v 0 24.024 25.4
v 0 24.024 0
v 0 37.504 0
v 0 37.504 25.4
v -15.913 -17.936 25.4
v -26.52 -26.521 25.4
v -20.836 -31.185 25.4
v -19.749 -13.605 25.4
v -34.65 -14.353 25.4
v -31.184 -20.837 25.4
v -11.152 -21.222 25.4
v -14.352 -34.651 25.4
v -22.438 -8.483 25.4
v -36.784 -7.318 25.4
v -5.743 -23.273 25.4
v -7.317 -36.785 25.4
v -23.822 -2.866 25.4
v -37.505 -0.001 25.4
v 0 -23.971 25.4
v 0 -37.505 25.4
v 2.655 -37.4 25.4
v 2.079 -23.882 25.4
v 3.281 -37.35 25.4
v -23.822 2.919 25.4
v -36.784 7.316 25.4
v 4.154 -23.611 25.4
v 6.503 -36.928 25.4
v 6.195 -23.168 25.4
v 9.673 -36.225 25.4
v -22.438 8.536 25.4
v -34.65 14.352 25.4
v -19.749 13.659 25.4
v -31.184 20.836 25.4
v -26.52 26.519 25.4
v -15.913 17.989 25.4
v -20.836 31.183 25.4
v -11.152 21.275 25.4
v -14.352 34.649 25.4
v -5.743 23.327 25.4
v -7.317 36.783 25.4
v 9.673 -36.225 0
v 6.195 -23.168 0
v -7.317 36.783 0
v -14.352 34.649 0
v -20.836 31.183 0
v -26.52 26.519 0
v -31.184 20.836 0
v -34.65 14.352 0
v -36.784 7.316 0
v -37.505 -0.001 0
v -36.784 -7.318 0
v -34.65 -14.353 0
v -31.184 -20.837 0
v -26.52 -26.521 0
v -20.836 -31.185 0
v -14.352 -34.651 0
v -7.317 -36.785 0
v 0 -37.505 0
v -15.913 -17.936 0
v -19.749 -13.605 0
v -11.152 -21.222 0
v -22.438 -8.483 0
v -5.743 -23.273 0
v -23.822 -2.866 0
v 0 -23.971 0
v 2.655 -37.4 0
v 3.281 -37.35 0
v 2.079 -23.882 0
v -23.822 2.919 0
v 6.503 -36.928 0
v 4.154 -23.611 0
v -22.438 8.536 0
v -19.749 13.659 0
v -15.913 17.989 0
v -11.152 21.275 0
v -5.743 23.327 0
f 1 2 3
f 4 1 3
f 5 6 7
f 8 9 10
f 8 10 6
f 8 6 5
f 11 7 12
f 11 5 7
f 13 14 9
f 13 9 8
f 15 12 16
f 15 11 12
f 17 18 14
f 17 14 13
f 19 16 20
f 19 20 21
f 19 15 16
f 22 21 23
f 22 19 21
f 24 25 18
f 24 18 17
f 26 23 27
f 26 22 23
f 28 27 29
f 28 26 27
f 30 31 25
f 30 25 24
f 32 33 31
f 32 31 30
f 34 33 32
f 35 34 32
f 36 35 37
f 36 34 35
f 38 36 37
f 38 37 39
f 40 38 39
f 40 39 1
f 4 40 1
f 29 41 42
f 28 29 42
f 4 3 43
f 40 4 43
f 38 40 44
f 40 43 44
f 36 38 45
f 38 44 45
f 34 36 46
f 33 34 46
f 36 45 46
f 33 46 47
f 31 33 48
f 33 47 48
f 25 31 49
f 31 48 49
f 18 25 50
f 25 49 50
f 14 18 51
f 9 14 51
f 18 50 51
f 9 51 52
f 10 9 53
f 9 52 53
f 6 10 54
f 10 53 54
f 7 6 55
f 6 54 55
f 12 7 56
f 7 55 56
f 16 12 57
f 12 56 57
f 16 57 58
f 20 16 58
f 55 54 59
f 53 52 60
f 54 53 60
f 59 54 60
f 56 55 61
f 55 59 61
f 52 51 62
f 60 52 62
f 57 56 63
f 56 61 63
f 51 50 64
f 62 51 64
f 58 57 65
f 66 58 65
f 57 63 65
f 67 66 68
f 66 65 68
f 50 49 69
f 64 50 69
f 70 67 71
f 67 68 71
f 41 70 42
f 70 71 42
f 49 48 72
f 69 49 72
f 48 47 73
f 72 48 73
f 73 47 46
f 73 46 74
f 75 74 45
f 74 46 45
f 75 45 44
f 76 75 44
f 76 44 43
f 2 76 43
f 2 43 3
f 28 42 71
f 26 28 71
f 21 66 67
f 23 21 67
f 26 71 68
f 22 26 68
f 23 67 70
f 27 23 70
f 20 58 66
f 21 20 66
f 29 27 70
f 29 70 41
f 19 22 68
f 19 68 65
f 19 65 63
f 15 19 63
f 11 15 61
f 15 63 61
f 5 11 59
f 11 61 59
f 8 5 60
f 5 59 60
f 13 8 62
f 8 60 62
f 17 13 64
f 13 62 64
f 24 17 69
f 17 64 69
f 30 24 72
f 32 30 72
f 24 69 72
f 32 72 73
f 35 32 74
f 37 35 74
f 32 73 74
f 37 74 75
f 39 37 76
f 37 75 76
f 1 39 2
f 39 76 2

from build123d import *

# Parameters (mm, degrees)
F1_DEPTH = 25.4


with BuildPart() as f1:
    # F0 (on Top) → F1 (new body)
    with BuildSketch(Plane.XY):
        with BuildLine():
            Line((0, 24.024129), (0, 37.503868))
            ThreePointArc((0, 37.503868), (-37.504638, -0.000769), (0, -37.505407))
            Line((0, -37.505407), (2.655318, -37.400453))
            Line((2.655318, -37.400453), (3.281114, -37.349965))
            Line((3.281114, -37.349965), (6.502855, -36.928073))
            Line((6.502855, -36.928073), (9.673457, -36.224913))
            Line((9.673457, -36.224913), (6.195297, -23.168214))
            Line((6.195297, -23.168214), (4.153784, -23.611279))
            Line((4.153784, -23.611279), (2.079332, -23.881992))
            Line((2.079332, -23.881992), (0, -23.970587))
            ThreePointArc((0, -23.970587), (-23.997358, 0.026771), (0, 24.024129))
        make_face()
    extrude(amount=F1_DEPTH)


solid = f1.part
